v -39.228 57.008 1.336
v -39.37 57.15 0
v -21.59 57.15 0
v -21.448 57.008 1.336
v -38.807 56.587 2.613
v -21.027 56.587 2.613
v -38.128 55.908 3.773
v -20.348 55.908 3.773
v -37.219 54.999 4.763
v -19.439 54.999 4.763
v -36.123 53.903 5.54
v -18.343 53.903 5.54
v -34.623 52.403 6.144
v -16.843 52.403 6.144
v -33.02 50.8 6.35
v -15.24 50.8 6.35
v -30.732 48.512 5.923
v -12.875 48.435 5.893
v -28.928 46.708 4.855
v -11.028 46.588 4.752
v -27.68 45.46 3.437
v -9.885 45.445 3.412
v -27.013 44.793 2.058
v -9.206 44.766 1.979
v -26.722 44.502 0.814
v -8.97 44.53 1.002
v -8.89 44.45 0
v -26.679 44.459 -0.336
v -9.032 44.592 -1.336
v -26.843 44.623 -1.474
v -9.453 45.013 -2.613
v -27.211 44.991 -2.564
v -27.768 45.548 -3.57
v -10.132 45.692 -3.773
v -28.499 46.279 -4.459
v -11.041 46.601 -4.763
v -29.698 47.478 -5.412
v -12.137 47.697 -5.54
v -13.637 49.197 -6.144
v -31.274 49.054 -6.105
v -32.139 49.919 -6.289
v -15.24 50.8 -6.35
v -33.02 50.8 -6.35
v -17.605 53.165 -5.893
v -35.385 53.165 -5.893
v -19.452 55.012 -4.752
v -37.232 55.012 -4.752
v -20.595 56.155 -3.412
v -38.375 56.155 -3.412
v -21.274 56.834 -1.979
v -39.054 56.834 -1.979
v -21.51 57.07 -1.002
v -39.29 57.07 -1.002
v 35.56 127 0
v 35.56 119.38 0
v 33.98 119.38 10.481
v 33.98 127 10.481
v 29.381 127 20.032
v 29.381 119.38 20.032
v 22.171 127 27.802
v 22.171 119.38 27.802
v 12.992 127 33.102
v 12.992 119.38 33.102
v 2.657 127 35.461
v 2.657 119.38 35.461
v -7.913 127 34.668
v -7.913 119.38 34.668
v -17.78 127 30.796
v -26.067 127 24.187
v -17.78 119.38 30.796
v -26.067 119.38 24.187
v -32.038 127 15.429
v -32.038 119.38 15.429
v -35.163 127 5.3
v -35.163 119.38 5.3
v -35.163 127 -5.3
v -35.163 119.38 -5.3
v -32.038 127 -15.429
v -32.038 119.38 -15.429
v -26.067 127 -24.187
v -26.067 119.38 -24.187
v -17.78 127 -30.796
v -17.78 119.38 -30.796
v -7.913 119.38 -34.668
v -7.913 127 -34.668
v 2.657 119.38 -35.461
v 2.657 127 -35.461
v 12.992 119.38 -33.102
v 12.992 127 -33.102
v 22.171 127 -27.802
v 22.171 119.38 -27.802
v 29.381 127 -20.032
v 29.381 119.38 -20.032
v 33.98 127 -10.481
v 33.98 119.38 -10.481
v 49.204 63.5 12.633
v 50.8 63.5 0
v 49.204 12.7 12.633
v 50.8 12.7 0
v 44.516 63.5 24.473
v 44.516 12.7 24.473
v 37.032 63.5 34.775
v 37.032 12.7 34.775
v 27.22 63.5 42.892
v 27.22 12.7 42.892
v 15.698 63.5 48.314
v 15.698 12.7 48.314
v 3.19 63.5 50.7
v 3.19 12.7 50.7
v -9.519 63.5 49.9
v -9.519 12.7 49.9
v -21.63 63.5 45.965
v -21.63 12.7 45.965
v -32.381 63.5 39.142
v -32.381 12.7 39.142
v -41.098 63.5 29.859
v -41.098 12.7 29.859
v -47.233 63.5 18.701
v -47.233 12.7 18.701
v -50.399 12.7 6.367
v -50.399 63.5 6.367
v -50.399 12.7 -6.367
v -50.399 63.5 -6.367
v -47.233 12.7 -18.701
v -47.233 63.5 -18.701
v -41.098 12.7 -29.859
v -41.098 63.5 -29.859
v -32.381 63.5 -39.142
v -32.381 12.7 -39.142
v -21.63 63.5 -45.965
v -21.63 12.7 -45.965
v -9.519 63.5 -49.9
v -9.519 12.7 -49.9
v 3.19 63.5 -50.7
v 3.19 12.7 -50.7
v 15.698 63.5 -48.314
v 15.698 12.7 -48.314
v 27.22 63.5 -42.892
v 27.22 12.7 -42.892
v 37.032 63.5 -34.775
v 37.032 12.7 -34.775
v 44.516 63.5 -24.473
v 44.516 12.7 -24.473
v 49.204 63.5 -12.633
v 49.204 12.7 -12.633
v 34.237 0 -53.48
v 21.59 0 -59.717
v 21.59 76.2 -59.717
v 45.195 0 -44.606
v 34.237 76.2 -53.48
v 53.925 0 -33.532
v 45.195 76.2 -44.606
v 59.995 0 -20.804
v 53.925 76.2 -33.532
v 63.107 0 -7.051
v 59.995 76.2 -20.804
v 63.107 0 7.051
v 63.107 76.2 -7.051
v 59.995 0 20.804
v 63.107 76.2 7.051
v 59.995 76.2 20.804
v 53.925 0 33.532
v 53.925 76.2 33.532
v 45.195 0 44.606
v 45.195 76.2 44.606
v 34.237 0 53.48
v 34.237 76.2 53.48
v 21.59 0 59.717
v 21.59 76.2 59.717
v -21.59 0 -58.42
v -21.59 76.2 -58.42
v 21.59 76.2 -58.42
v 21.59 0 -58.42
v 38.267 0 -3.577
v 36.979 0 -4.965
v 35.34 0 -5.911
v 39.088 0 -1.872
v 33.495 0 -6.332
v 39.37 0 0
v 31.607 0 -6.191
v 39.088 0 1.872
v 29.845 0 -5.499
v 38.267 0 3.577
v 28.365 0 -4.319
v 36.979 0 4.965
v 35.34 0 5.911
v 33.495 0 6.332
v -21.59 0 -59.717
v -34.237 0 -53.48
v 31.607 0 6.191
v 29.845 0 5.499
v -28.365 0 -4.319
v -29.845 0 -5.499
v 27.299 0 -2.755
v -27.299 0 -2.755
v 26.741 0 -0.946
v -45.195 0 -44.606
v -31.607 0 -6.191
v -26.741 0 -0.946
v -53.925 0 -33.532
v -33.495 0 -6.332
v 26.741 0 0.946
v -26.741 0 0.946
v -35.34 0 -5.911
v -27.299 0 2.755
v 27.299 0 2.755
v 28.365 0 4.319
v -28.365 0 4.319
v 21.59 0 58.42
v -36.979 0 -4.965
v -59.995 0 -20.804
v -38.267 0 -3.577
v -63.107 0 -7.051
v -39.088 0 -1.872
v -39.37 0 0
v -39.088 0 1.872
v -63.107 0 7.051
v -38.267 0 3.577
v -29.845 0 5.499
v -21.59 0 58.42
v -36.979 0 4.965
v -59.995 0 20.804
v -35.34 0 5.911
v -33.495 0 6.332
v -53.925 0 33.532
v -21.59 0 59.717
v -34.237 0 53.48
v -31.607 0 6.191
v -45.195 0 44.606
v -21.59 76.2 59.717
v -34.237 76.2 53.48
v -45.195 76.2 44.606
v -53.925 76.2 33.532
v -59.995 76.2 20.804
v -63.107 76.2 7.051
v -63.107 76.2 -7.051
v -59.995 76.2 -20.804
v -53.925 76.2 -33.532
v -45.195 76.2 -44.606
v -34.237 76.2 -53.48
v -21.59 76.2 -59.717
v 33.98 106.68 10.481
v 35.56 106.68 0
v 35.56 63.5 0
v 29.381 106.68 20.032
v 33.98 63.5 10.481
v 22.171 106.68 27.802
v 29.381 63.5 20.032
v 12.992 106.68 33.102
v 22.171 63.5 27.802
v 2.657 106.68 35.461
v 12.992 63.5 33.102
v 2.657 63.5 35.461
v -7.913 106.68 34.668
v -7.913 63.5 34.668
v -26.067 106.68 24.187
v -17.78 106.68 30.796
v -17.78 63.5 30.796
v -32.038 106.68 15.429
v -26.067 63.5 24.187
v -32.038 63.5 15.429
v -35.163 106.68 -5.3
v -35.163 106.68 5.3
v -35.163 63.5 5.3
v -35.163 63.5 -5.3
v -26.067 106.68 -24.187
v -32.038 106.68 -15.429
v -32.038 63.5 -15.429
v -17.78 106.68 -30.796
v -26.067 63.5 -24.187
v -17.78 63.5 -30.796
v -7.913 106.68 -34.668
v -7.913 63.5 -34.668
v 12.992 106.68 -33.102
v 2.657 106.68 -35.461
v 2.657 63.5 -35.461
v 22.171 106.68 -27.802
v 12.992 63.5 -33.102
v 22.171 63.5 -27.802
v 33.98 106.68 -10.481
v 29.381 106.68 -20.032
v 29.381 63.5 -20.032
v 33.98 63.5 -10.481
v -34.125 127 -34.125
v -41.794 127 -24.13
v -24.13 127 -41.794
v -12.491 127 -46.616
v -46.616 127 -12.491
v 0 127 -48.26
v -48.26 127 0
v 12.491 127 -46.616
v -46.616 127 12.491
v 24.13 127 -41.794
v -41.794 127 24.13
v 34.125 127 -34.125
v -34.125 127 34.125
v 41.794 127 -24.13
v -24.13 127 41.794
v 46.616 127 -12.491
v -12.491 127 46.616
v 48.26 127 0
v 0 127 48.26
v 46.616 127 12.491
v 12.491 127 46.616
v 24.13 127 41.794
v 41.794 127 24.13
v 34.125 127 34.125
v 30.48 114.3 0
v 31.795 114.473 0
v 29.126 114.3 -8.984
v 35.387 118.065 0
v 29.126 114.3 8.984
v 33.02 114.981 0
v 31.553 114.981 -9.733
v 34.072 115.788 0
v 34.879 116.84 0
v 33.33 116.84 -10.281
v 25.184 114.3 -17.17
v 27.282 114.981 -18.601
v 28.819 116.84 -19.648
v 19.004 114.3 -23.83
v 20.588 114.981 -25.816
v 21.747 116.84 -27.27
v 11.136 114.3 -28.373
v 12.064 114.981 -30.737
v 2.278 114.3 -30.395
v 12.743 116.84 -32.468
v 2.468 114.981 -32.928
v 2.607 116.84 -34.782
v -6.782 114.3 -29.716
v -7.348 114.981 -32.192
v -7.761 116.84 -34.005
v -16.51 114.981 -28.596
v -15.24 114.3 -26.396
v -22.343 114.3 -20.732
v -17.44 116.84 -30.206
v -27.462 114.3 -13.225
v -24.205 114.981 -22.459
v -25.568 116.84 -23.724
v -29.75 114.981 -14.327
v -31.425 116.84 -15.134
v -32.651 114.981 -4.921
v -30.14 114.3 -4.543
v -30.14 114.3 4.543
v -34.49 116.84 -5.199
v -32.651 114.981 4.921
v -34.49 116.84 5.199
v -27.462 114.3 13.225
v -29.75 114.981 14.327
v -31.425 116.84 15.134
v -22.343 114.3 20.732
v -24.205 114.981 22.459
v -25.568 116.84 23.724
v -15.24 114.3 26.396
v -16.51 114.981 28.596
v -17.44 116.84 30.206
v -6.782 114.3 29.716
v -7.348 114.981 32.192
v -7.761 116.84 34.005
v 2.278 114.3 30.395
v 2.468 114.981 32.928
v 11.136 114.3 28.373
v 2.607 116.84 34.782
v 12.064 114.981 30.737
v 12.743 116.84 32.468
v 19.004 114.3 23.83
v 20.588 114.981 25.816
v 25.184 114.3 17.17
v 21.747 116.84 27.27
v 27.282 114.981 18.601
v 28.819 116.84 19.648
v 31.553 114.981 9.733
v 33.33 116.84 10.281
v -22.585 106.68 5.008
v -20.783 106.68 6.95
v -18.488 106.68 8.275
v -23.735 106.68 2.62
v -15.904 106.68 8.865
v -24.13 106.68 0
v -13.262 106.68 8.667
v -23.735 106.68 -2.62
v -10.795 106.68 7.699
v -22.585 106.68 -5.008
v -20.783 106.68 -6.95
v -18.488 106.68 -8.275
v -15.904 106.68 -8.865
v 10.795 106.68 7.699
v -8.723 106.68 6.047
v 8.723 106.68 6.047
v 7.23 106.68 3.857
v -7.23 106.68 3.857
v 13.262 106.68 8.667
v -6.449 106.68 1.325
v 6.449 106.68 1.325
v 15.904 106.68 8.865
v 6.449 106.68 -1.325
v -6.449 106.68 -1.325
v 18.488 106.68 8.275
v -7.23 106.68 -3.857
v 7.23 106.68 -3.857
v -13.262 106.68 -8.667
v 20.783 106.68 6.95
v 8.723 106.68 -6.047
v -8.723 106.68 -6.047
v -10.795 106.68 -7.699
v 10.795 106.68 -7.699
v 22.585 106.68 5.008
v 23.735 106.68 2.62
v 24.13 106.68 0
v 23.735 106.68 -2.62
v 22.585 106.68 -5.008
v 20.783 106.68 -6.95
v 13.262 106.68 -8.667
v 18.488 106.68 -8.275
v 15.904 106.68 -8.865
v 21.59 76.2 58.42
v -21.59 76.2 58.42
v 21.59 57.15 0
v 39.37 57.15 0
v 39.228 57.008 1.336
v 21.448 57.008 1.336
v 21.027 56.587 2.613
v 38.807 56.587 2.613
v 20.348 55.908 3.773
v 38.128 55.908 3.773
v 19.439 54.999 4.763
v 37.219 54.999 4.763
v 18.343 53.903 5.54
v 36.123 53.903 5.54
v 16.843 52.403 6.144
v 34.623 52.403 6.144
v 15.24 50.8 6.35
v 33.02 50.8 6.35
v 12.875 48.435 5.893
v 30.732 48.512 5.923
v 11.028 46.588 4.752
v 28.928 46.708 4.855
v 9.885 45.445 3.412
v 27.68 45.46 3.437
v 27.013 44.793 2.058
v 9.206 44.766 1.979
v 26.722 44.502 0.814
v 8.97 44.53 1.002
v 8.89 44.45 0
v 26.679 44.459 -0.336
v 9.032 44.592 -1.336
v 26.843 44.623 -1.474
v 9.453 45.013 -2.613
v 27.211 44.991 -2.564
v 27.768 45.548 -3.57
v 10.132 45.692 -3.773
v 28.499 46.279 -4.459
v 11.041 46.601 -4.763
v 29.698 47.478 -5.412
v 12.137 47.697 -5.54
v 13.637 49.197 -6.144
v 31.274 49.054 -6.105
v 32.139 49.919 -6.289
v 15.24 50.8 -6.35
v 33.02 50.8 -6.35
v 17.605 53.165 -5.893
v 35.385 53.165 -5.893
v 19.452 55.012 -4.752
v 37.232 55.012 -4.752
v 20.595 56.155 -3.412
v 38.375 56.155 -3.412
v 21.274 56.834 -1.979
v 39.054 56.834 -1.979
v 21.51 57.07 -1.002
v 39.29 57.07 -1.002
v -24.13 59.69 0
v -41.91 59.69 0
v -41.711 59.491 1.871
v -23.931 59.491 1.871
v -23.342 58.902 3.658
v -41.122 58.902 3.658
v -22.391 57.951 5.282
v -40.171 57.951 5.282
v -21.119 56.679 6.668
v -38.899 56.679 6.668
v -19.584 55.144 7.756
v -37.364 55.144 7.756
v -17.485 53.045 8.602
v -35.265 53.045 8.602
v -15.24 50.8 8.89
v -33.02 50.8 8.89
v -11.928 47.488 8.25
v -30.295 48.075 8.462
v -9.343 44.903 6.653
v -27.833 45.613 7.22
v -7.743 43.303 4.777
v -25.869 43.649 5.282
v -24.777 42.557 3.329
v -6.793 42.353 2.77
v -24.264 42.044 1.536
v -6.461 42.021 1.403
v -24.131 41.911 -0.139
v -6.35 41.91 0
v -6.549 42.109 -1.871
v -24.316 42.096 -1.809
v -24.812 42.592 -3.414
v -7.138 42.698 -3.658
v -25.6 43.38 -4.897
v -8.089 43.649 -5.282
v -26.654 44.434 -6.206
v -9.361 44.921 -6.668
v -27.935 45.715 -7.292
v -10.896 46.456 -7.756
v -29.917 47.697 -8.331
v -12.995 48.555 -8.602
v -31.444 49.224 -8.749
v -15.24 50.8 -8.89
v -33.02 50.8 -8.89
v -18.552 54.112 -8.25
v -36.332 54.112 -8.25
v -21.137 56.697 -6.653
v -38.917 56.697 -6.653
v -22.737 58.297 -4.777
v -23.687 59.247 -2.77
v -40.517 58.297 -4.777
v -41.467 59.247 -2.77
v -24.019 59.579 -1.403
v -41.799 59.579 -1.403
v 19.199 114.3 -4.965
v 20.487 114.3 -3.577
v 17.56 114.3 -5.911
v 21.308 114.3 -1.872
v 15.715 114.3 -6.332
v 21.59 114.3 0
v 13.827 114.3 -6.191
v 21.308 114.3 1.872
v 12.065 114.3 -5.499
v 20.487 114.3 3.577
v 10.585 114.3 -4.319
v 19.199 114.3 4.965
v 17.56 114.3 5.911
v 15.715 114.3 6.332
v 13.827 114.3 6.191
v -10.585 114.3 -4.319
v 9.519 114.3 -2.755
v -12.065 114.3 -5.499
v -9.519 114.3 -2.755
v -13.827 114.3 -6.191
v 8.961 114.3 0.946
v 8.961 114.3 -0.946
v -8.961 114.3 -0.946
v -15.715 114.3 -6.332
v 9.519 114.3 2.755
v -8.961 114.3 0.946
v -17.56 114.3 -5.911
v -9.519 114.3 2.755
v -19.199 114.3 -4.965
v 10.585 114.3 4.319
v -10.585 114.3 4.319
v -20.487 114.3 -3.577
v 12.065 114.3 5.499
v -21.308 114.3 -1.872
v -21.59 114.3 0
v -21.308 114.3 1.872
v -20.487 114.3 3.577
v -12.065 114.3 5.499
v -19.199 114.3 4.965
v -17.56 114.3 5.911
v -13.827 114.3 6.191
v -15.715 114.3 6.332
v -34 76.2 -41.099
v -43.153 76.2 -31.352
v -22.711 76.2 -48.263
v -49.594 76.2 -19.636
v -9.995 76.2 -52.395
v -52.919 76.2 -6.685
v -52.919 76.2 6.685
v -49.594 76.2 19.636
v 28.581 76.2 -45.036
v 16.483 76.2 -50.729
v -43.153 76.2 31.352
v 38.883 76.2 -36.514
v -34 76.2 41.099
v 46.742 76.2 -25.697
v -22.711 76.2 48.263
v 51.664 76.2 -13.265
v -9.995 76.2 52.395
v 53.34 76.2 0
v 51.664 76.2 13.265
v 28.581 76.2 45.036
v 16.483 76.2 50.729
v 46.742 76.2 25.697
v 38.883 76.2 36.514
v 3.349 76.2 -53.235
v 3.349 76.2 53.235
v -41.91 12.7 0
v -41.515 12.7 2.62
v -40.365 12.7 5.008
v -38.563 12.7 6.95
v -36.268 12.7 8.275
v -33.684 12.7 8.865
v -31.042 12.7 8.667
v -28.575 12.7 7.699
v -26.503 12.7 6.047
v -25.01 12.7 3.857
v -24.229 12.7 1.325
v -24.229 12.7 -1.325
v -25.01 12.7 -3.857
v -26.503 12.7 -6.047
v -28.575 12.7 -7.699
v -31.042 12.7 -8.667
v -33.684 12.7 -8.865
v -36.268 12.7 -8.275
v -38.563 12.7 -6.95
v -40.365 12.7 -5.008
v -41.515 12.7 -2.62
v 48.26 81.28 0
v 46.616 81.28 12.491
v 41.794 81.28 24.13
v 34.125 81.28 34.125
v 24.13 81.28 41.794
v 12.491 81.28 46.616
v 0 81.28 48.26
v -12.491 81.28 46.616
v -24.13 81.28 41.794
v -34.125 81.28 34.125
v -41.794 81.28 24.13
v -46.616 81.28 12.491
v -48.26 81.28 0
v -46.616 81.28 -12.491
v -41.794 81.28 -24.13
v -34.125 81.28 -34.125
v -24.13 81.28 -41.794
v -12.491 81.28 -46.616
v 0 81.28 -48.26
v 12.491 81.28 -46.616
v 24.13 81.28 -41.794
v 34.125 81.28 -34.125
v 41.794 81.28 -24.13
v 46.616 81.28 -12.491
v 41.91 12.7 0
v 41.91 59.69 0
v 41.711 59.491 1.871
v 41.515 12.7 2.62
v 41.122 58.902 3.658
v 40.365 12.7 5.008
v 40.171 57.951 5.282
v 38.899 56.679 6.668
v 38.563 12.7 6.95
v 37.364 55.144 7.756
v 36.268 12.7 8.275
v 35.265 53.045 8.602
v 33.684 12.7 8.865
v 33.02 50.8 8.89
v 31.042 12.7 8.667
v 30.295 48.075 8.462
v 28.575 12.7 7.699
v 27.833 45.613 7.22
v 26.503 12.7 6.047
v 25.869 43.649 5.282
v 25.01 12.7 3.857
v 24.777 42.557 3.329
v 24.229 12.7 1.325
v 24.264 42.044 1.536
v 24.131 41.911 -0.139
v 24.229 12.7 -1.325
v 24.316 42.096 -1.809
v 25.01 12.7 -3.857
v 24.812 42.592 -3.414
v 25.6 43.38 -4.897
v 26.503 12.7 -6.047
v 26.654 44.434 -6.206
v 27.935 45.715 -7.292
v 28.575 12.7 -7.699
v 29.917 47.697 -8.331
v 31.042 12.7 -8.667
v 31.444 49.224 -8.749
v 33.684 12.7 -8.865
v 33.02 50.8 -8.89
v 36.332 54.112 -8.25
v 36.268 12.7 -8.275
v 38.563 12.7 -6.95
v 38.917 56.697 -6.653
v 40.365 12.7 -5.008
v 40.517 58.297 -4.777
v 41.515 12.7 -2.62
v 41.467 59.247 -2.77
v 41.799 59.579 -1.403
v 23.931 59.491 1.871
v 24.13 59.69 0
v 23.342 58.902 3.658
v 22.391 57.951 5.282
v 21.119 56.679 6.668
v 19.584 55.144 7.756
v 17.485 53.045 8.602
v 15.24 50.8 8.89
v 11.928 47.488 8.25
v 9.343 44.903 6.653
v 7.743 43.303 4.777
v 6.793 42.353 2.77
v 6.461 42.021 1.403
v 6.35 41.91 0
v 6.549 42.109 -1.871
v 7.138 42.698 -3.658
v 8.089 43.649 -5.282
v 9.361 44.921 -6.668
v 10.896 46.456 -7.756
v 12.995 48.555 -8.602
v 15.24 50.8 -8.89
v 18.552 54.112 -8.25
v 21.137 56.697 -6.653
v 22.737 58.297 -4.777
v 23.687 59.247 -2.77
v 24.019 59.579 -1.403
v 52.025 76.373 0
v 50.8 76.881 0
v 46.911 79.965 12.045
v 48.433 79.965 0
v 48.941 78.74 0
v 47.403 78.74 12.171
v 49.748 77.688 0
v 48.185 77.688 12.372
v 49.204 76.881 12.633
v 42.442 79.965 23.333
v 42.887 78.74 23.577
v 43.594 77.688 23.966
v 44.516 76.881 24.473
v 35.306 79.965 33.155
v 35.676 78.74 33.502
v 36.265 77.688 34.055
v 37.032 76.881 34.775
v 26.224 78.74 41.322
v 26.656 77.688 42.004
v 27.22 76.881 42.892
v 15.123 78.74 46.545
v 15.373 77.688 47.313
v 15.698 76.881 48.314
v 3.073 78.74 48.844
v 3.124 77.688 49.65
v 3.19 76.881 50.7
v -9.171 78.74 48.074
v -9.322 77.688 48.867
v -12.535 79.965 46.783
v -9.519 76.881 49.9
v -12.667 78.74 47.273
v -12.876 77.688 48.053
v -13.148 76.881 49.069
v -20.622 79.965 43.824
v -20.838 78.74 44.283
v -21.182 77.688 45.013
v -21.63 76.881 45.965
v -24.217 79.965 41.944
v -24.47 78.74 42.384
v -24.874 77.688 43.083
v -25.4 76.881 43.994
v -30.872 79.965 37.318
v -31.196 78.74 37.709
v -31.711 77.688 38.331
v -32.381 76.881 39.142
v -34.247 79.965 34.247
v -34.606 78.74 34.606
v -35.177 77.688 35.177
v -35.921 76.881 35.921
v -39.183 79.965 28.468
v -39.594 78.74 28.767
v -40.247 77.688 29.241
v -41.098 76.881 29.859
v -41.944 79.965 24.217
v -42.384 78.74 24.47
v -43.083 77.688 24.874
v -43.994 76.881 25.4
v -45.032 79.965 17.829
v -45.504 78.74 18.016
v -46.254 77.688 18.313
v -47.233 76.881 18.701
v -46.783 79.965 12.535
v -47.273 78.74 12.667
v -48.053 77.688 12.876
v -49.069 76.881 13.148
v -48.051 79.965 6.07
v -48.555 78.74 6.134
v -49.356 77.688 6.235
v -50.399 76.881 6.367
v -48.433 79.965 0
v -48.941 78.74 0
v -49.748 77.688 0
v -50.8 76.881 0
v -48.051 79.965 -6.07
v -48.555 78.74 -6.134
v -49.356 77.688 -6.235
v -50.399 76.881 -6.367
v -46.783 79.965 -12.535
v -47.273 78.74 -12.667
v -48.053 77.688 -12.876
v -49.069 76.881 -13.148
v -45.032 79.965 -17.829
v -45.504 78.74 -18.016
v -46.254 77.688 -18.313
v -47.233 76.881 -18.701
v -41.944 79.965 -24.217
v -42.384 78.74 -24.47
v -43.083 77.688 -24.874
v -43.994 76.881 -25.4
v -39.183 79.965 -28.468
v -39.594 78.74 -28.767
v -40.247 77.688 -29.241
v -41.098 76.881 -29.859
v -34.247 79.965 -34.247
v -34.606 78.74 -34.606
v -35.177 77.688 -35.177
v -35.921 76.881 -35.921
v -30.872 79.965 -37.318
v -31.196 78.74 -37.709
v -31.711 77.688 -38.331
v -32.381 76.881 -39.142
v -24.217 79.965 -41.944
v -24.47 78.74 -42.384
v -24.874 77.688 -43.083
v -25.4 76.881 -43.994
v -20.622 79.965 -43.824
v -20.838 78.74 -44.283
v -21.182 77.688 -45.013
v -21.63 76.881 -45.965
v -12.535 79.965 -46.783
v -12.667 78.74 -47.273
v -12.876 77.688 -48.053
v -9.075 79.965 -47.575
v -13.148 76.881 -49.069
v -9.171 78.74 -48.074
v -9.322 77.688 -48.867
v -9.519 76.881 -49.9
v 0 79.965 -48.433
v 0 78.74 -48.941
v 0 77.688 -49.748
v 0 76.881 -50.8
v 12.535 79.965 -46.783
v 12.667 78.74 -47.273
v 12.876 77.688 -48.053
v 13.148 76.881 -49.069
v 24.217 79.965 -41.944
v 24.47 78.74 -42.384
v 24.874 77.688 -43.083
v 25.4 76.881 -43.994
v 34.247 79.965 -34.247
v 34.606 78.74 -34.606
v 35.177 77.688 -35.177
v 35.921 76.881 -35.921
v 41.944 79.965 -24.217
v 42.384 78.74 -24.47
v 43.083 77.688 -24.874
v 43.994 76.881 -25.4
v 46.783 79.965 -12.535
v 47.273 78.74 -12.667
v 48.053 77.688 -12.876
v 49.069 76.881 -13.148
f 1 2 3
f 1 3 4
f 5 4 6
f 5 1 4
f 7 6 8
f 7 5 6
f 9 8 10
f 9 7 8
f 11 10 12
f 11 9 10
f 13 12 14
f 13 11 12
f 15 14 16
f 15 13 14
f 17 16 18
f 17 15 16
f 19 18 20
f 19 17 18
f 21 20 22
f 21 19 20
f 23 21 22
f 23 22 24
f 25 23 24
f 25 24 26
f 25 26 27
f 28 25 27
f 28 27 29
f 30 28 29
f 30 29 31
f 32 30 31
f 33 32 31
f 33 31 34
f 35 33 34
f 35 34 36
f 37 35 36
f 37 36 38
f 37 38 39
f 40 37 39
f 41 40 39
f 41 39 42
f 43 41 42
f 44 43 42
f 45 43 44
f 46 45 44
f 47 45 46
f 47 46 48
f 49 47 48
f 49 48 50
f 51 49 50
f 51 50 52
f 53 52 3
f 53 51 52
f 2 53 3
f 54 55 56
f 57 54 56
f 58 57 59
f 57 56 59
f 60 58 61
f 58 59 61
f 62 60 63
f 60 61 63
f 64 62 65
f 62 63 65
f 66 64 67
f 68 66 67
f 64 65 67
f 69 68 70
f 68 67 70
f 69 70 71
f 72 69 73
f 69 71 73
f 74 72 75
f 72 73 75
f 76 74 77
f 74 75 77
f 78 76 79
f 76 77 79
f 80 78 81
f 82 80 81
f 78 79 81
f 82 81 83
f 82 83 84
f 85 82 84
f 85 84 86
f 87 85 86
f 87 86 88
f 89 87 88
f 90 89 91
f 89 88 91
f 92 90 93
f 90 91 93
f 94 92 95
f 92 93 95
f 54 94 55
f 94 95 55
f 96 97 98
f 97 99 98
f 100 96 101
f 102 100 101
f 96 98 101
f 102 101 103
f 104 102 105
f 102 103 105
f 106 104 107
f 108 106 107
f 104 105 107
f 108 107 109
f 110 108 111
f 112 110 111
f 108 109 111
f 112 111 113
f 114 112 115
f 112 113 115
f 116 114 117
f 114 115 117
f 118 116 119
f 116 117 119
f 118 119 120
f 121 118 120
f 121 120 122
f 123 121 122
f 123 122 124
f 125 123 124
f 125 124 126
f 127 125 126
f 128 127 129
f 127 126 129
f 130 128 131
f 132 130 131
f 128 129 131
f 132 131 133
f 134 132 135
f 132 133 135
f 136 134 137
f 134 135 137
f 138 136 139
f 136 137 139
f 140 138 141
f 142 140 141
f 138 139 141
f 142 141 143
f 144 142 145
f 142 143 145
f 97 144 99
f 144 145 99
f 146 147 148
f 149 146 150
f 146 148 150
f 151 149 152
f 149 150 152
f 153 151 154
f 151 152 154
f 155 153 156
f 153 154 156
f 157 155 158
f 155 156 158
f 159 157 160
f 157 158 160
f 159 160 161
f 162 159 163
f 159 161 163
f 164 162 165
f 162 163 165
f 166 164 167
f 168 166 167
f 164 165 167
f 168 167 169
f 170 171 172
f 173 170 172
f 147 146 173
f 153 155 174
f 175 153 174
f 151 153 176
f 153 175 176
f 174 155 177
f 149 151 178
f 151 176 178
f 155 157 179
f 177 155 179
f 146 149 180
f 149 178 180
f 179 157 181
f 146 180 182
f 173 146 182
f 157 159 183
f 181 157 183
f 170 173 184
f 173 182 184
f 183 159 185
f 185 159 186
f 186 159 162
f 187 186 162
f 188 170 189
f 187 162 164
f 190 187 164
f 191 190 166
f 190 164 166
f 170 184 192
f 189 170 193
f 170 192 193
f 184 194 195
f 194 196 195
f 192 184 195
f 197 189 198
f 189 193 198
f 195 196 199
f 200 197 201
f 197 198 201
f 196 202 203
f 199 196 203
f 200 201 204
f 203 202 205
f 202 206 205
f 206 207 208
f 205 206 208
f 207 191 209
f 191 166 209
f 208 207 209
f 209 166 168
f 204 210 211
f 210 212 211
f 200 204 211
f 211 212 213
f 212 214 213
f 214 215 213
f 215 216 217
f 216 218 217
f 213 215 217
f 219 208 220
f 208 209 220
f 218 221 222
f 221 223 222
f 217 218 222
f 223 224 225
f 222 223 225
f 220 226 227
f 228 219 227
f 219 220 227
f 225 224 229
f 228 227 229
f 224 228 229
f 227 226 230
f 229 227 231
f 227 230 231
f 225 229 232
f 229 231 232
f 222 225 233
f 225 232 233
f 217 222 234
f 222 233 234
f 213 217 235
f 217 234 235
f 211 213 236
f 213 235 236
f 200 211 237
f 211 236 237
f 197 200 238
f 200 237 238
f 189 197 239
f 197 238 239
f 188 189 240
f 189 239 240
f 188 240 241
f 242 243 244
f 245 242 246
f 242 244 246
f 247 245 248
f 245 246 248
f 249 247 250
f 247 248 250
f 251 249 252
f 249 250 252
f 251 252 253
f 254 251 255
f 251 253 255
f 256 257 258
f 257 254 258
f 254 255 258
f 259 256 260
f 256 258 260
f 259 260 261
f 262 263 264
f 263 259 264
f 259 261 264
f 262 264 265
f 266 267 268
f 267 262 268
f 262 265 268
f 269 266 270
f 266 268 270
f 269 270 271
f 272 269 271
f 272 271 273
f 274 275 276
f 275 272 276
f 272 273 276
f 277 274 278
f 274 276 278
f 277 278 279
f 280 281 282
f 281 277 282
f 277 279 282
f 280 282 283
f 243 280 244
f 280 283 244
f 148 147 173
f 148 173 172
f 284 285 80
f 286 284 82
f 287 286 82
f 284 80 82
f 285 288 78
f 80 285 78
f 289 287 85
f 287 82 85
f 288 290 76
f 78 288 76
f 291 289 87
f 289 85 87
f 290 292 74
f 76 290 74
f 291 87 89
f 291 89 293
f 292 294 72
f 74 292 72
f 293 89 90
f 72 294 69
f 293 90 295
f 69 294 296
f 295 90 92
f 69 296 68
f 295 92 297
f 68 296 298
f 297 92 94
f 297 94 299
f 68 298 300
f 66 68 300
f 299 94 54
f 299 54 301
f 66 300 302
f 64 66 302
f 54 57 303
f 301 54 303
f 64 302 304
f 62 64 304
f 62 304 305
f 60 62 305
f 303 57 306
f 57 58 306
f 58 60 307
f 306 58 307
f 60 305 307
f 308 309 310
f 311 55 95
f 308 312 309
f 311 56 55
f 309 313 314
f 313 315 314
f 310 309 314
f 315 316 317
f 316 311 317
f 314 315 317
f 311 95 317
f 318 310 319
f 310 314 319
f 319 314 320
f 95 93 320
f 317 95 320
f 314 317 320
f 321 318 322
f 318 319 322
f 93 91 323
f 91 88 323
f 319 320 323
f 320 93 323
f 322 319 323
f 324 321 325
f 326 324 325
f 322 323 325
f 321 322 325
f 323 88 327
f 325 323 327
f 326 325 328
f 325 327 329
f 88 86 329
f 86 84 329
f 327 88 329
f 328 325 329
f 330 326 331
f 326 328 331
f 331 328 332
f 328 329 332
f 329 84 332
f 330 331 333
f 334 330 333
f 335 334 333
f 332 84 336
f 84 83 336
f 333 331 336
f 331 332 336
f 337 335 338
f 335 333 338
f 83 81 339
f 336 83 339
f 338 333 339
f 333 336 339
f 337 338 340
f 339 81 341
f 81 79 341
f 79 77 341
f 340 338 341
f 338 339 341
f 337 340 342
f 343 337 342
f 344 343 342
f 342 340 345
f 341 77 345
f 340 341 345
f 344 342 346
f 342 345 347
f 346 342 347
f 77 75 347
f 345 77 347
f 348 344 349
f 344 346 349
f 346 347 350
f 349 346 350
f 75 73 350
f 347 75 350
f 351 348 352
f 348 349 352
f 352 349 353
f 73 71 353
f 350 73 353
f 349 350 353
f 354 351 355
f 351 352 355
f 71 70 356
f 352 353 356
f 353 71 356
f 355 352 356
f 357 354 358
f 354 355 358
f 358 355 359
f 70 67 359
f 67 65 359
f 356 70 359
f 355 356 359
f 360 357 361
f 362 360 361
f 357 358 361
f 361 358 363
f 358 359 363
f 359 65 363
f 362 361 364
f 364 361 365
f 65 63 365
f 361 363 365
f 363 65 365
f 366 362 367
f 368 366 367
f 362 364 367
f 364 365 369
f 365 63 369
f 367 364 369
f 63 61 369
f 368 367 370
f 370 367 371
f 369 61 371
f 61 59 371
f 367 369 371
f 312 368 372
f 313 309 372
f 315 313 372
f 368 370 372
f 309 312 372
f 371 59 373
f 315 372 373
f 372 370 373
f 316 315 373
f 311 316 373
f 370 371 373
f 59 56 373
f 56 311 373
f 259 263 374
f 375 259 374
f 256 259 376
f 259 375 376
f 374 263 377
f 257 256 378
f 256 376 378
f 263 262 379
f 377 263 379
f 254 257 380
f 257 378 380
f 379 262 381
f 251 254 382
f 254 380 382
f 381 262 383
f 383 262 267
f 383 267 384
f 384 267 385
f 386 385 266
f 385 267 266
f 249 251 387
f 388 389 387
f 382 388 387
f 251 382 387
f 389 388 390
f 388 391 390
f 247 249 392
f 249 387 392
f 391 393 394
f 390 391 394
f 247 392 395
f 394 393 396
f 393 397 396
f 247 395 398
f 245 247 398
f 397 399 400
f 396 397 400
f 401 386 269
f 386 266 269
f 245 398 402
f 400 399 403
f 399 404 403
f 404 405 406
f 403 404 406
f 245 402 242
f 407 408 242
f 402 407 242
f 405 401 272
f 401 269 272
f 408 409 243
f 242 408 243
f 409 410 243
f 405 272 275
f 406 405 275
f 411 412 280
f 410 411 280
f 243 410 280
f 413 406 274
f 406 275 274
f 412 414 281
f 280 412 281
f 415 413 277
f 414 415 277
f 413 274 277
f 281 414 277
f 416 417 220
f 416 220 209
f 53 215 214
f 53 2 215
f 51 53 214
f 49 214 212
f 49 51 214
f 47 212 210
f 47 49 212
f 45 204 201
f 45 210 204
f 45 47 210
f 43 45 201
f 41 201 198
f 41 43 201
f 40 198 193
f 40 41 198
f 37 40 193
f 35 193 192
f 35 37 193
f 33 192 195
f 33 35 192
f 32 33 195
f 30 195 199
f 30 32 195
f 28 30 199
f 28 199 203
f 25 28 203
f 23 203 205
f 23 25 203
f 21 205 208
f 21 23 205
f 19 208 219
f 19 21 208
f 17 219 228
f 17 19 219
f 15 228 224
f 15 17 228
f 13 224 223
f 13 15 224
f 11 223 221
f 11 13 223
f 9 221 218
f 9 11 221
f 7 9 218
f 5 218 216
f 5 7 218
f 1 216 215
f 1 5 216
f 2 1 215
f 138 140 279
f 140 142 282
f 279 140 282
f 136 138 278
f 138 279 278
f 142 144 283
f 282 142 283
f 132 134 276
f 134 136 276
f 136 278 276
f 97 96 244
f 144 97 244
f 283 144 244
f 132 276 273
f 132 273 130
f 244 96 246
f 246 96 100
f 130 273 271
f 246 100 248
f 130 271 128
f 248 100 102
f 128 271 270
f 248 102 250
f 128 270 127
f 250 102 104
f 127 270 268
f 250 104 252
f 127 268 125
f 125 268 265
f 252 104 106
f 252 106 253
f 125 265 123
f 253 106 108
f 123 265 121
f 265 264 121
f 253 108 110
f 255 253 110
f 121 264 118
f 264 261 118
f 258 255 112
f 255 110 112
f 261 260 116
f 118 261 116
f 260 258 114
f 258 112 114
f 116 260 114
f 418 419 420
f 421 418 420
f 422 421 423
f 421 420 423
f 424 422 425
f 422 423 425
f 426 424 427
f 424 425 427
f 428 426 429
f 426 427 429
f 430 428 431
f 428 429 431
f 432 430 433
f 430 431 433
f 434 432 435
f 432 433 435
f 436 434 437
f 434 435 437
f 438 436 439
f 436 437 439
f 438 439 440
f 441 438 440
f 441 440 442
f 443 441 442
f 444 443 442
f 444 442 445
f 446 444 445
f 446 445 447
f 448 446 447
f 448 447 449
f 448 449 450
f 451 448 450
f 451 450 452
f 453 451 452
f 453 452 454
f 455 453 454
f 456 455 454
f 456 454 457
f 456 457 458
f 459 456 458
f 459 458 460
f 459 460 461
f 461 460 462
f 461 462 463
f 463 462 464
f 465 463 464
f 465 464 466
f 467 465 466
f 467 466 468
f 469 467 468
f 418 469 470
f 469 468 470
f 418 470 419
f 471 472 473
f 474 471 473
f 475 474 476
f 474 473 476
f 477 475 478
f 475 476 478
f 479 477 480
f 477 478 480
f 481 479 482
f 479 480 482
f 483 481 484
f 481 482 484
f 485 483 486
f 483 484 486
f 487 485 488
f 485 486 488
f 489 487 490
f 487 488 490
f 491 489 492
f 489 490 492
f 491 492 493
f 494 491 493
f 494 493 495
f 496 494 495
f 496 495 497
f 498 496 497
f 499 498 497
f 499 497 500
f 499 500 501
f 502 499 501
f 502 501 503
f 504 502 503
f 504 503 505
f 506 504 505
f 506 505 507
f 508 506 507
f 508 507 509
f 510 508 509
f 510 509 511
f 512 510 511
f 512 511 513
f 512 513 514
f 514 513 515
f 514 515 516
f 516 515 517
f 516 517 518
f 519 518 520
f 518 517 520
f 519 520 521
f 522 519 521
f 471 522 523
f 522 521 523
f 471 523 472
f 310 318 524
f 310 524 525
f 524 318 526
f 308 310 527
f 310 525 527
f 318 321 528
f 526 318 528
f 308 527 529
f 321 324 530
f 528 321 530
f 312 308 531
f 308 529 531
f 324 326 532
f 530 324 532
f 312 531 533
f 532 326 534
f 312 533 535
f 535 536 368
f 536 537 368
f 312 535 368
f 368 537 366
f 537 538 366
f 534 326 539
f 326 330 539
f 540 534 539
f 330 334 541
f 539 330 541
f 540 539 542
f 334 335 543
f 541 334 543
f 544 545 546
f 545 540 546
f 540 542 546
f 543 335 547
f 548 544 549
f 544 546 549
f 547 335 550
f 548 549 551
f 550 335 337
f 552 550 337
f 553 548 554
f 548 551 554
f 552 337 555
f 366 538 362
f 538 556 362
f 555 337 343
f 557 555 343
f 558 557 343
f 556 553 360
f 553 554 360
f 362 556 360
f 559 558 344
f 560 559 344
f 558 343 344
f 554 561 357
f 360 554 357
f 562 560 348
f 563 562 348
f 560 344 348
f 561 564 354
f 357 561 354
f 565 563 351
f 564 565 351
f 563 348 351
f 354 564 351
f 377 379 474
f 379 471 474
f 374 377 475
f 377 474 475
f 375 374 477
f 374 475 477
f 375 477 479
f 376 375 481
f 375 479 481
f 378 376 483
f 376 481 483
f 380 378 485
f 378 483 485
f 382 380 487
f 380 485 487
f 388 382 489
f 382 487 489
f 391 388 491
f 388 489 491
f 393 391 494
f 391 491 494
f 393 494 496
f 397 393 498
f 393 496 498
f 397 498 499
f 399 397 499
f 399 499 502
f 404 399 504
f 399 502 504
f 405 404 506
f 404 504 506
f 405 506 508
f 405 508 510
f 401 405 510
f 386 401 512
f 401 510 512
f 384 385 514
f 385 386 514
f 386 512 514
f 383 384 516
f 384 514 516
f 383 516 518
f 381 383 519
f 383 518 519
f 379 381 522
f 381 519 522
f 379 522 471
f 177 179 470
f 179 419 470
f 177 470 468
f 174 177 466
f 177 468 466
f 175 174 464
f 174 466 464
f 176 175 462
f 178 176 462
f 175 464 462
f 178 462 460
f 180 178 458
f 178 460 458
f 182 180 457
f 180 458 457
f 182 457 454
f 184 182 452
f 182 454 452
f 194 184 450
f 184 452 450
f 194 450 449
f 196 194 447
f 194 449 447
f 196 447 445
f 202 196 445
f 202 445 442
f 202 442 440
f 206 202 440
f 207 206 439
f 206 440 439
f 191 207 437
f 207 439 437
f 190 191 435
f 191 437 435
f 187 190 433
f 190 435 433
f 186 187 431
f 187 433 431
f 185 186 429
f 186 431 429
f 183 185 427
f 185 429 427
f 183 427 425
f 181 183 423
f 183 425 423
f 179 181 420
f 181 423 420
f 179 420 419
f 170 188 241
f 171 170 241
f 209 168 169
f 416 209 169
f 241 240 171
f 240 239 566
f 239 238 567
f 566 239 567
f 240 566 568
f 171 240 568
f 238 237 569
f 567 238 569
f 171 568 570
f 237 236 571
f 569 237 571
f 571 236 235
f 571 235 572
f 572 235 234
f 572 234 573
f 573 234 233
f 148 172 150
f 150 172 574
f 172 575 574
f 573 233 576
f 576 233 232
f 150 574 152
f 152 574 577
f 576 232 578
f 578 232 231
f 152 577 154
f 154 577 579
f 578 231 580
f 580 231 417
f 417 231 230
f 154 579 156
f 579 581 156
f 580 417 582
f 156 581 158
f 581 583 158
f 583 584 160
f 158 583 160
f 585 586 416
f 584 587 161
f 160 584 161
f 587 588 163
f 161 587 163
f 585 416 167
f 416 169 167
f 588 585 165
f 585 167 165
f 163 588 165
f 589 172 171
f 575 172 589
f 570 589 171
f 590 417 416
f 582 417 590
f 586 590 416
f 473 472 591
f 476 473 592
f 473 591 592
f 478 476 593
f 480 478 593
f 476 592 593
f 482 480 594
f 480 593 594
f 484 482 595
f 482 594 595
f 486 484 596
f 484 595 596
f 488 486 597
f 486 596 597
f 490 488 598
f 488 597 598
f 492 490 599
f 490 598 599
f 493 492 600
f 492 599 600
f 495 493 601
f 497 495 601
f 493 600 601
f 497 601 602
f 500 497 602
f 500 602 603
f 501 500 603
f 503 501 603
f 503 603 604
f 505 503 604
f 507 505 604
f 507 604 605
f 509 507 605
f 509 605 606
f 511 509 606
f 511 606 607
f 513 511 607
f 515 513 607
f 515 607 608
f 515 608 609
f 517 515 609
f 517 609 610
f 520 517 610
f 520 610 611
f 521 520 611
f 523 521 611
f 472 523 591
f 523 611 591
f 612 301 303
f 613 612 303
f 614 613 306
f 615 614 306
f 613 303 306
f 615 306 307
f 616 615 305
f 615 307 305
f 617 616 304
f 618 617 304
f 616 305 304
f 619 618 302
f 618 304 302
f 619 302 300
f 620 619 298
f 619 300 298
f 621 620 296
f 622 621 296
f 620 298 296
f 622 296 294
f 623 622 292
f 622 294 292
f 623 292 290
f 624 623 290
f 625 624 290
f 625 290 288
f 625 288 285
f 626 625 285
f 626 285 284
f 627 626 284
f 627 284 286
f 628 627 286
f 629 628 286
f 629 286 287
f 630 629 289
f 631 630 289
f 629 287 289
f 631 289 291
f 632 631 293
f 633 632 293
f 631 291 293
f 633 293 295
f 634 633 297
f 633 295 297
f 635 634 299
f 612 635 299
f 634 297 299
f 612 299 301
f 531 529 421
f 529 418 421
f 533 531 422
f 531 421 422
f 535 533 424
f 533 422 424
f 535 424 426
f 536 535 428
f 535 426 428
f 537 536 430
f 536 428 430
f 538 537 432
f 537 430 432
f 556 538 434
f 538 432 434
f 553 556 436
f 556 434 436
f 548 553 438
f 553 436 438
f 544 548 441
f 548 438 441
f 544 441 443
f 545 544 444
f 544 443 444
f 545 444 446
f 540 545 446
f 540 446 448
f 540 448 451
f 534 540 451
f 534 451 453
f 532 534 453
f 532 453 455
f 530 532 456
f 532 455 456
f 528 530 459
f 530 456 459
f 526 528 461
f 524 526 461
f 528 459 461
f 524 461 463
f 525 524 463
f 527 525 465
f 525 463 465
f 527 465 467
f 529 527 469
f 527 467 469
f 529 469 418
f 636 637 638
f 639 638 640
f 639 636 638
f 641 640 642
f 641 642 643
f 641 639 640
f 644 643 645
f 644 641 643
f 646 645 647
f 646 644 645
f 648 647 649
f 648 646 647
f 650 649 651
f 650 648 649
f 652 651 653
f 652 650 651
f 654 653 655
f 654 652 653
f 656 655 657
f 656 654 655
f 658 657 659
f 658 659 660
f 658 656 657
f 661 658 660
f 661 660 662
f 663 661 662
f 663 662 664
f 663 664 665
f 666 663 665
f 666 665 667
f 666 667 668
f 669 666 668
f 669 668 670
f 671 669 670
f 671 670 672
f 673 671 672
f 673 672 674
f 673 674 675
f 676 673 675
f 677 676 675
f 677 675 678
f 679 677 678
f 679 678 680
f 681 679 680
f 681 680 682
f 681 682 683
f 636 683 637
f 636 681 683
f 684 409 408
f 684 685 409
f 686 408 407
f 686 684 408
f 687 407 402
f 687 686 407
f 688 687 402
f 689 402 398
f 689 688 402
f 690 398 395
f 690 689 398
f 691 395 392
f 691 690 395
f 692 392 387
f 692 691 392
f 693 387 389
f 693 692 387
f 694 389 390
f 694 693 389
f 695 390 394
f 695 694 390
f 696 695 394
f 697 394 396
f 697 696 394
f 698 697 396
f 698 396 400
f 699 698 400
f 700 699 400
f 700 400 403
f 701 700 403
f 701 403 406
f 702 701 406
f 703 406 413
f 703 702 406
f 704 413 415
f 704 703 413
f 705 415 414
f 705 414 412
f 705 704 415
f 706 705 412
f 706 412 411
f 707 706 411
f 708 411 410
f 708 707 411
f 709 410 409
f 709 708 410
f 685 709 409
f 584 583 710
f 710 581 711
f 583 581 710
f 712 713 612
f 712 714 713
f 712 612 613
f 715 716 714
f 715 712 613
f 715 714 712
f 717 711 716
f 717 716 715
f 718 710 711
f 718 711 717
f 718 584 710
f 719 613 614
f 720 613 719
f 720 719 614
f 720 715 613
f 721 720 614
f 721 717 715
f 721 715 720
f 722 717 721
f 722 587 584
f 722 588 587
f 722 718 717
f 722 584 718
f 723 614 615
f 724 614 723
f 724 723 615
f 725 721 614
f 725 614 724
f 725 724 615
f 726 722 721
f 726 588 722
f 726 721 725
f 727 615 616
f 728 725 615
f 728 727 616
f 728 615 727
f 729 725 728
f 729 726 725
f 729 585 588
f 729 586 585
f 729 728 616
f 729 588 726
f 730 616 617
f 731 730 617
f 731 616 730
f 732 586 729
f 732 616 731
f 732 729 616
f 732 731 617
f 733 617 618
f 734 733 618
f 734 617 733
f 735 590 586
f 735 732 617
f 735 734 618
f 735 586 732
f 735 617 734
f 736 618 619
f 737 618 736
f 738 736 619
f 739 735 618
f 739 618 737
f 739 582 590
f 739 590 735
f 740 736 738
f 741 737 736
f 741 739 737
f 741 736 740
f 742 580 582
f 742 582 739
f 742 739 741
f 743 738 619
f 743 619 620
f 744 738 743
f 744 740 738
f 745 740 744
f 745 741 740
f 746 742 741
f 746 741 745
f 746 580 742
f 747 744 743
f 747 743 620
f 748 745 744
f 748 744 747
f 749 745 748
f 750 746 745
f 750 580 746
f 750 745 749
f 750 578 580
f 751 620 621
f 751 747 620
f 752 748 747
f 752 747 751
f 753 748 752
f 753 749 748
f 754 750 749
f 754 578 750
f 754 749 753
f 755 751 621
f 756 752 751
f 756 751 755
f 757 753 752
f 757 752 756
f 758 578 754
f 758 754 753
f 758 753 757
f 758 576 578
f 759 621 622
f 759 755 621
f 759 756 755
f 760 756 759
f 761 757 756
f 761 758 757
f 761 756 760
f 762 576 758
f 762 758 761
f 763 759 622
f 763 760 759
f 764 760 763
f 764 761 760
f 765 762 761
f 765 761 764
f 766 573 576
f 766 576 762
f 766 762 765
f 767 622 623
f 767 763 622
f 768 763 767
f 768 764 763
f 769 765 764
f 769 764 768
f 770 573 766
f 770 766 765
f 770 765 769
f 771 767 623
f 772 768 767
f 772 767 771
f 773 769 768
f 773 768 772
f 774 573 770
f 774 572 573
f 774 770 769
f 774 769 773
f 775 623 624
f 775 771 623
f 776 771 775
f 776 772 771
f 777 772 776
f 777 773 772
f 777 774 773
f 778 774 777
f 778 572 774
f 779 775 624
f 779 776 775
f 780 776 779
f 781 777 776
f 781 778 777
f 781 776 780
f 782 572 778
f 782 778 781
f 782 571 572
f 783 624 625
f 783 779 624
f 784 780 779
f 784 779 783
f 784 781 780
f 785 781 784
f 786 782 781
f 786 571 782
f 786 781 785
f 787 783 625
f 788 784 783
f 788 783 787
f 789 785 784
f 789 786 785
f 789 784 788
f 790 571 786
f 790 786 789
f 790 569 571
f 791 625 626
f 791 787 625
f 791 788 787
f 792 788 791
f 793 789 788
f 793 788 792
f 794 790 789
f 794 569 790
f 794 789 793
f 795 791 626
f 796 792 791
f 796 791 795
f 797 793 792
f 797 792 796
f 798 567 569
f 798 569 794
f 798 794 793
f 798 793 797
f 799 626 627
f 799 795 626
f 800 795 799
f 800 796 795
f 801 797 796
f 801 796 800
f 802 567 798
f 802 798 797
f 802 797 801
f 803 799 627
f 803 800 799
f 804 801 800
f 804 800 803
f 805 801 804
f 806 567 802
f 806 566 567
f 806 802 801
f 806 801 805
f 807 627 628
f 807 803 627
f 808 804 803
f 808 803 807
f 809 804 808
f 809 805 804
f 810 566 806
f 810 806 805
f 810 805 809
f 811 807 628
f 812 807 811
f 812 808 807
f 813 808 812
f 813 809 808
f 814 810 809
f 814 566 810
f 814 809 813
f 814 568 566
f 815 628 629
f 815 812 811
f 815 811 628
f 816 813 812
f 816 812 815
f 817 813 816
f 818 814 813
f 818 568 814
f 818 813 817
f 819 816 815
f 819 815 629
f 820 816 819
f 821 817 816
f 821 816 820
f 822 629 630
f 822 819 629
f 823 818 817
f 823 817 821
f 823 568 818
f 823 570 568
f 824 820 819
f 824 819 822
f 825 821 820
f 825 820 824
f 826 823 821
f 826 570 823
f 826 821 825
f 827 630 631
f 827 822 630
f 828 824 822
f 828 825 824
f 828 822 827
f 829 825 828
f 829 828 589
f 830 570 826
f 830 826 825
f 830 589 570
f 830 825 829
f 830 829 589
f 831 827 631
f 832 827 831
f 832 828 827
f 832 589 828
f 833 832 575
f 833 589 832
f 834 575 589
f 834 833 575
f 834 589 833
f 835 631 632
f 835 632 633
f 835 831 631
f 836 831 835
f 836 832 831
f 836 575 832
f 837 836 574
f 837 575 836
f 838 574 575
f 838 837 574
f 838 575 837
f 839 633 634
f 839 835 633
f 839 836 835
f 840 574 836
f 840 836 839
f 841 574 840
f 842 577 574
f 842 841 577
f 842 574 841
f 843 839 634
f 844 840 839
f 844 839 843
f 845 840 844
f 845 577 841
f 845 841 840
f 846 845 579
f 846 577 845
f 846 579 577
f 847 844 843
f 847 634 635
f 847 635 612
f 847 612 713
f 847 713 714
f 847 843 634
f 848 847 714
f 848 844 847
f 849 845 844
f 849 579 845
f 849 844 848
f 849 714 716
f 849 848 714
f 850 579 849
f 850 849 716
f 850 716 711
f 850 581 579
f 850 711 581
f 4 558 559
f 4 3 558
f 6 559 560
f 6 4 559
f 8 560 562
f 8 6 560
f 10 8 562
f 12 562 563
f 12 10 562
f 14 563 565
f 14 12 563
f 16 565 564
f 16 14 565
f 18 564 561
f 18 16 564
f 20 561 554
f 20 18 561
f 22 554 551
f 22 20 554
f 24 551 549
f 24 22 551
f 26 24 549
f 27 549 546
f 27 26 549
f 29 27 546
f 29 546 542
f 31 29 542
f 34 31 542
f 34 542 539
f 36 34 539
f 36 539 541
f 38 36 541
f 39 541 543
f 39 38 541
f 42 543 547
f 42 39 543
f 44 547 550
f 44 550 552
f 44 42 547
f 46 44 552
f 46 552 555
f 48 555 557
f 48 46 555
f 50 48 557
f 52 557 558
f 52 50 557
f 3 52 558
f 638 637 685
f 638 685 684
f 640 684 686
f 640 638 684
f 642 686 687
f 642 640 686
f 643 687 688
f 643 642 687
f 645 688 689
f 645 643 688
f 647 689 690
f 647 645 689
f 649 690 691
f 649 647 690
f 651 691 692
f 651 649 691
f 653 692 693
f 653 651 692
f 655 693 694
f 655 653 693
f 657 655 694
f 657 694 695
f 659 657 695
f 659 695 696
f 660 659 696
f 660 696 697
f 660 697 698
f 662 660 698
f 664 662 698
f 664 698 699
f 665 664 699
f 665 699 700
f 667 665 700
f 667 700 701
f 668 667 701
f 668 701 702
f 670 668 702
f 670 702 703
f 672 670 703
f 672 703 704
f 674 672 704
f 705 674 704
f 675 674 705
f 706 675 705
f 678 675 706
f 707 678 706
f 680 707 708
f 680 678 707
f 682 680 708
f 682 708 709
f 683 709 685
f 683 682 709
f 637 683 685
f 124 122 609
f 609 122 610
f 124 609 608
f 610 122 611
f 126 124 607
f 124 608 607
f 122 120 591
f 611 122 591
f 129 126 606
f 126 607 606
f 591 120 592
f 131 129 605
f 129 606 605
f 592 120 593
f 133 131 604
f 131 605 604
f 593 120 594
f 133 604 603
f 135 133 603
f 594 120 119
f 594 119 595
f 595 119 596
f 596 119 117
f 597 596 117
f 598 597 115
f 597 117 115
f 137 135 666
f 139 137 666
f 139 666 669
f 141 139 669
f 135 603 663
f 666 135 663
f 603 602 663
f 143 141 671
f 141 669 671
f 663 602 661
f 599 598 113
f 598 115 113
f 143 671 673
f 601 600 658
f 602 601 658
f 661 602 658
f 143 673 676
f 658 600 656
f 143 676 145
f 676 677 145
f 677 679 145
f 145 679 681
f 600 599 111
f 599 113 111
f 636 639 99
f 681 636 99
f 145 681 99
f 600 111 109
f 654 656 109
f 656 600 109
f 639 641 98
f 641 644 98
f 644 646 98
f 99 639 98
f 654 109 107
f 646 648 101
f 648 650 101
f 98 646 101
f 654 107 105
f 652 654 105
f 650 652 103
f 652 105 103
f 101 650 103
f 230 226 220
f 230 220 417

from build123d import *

# Parameters (mm, degrees)
SKETCH4_R           = 35.56
BOSS_EXTRUDE1_DEPTH = 7.62
SKETCH5_R           = 8.89
SKETCH5_R_2         = 6.35
SKETCH7_R           = 6.35
CUT_EXTRUDE1_DEPTH  = 13.7
SKETCH8_R           = 6.35
CUT_EXTRUDE2_DEPTH  = 7.62
SKETCH10_W          = 43.18
SKETCH10_H          = 76.2
CUT_EXTRUDE3_DEPTH  = 5.08
FILLET1_R           = 5.08
FILLET2_R           = 5.08


with BuildPart() as part:
    # Sketch3 → Revolve1 (revolve)
    with BuildSketch(Plane.XY):
        Polygon((0, 0), (63.5, 0), (63.5, 76.2), (48.26, 76.2), (48.26, 127), (35.56, 127), (35.56, 63.5), (50.8, 63.5), (50.8, 12.7), (0, 12.7), align=None)
    revolve(axis=Axis((0, 12.7, 0), (0, -1, 0)))

    # Sketch4 → Boss-Extrude1 (add)
    with BuildSketch(Plane(origin=(0, 114.3, 0), x_dir=(1, 0, 0), z_dir=(0, 1, 0))):
        Circle(SKETCH4_R)
    extrude(amount=-BOSS_EXTRUDE1_DEPTH)

    # Sweep1: sweep along a path in Sketch6
    with BuildLine(Plane.XY) as sweep1_path:
        Line((15.24, 114.3), (15.24, 50.8))
        Line((15.24, 50.8), (33.02, 50.8))
        Line((33.02, 50.8), (33.02, 12.7))
    # Sketch5 → Sweep1 (sweep)
    with BuildSketch(Plane(origin=(0, 114.3, 0), x_dir=(1, 0, 0), z_dir=(0, 1, 0))):
        with Locations((15.24, 0)):
            Circle(SKETCH5_R)
        with Locations((15.24, 0)):
            Circle(SKETCH5_R_2, mode=Mode.SUBTRACT)
    sweep1 = sweep(path=sweep1_path.line, transition=Transition.RIGHT)

    # Sketch7 → Cut-Extrude1 (cut, through all)
    with BuildSketch(Plane(origin=(0, 12.7, 0), x_dir=(1, 0, 0), z_dir=(0, 1, 0))):
        with Locations((33.02, 0)):
            Circle(SKETCH7_R)
    cut_extrude1 = extrude(amount=-CUT_EXTRUDE1_DEPTH, mode=Mode.SUBTRACT)

    # Sketch8 → Cut-Extrude2 (cut)
    with BuildSketch(Plane.XZ.offset(-106.68)):
        with Locations((15.24, 0)):
            Circle(SKETCH8_R)
    cut_extrude2 = extrude(amount=-CUT_EXTRUDE2_DEPTH, mode=Mode.SUBTRACT)

    # Mirror1: Sweep1, Cut-Extrude1, Cut-Extrude2 across plane
    add(sweep1.mirror(Plane(origin=(0, 0, 0), x_dir=(0, 0, 1), z_dir=(1, 0, 0))))
    add(cut_extrude1.mirror(Plane(origin=(0, 0, 0), x_dir=(0, 0, 1), z_dir=(1, 0, 0))), mode=Mode.SUBTRACT)
    add(cut_extrude2.mirror(Plane(origin=(0, 0, 0), x_dir=(0, 0, 1), z_dir=(1, 0, 0))), mode=Mode.SUBTRACT)

    # Sketch10 → Cut-Extrude3 (cut)
    with BuildSketch(Plane.XY.offset(63.5)):
        with Locations((0, 38.1)):
            Rectangle(SKETCH10_W, SKETCH10_H)
    cut_extrude3 = extrude(amount=-CUT_EXTRUDE3_DEPTH, mode=Mode.SUBTRACT)

    # Mirror2: Cut-Extrude3 across plane
    add(cut_extrude3.mirror(Plane.XY), mode=Mode.SUBTRACT)

    # Fillet1
    fillet1_edges = [part.edges().sort_by_distance(p)[0] for p in [
        (-35.56, 114.3, 0),
    ]]
    fillet(fillet1_edges, radius=FILLET1_R)

    # Fillet2
    fillet2_edges = [part.edges().sort_by_distance(p)[0] for p in [
        (-48.26, 76.2, 0),
    ]]
    fillet(fillet2_edges, radius=FILLET2_R)


solid = part.part
